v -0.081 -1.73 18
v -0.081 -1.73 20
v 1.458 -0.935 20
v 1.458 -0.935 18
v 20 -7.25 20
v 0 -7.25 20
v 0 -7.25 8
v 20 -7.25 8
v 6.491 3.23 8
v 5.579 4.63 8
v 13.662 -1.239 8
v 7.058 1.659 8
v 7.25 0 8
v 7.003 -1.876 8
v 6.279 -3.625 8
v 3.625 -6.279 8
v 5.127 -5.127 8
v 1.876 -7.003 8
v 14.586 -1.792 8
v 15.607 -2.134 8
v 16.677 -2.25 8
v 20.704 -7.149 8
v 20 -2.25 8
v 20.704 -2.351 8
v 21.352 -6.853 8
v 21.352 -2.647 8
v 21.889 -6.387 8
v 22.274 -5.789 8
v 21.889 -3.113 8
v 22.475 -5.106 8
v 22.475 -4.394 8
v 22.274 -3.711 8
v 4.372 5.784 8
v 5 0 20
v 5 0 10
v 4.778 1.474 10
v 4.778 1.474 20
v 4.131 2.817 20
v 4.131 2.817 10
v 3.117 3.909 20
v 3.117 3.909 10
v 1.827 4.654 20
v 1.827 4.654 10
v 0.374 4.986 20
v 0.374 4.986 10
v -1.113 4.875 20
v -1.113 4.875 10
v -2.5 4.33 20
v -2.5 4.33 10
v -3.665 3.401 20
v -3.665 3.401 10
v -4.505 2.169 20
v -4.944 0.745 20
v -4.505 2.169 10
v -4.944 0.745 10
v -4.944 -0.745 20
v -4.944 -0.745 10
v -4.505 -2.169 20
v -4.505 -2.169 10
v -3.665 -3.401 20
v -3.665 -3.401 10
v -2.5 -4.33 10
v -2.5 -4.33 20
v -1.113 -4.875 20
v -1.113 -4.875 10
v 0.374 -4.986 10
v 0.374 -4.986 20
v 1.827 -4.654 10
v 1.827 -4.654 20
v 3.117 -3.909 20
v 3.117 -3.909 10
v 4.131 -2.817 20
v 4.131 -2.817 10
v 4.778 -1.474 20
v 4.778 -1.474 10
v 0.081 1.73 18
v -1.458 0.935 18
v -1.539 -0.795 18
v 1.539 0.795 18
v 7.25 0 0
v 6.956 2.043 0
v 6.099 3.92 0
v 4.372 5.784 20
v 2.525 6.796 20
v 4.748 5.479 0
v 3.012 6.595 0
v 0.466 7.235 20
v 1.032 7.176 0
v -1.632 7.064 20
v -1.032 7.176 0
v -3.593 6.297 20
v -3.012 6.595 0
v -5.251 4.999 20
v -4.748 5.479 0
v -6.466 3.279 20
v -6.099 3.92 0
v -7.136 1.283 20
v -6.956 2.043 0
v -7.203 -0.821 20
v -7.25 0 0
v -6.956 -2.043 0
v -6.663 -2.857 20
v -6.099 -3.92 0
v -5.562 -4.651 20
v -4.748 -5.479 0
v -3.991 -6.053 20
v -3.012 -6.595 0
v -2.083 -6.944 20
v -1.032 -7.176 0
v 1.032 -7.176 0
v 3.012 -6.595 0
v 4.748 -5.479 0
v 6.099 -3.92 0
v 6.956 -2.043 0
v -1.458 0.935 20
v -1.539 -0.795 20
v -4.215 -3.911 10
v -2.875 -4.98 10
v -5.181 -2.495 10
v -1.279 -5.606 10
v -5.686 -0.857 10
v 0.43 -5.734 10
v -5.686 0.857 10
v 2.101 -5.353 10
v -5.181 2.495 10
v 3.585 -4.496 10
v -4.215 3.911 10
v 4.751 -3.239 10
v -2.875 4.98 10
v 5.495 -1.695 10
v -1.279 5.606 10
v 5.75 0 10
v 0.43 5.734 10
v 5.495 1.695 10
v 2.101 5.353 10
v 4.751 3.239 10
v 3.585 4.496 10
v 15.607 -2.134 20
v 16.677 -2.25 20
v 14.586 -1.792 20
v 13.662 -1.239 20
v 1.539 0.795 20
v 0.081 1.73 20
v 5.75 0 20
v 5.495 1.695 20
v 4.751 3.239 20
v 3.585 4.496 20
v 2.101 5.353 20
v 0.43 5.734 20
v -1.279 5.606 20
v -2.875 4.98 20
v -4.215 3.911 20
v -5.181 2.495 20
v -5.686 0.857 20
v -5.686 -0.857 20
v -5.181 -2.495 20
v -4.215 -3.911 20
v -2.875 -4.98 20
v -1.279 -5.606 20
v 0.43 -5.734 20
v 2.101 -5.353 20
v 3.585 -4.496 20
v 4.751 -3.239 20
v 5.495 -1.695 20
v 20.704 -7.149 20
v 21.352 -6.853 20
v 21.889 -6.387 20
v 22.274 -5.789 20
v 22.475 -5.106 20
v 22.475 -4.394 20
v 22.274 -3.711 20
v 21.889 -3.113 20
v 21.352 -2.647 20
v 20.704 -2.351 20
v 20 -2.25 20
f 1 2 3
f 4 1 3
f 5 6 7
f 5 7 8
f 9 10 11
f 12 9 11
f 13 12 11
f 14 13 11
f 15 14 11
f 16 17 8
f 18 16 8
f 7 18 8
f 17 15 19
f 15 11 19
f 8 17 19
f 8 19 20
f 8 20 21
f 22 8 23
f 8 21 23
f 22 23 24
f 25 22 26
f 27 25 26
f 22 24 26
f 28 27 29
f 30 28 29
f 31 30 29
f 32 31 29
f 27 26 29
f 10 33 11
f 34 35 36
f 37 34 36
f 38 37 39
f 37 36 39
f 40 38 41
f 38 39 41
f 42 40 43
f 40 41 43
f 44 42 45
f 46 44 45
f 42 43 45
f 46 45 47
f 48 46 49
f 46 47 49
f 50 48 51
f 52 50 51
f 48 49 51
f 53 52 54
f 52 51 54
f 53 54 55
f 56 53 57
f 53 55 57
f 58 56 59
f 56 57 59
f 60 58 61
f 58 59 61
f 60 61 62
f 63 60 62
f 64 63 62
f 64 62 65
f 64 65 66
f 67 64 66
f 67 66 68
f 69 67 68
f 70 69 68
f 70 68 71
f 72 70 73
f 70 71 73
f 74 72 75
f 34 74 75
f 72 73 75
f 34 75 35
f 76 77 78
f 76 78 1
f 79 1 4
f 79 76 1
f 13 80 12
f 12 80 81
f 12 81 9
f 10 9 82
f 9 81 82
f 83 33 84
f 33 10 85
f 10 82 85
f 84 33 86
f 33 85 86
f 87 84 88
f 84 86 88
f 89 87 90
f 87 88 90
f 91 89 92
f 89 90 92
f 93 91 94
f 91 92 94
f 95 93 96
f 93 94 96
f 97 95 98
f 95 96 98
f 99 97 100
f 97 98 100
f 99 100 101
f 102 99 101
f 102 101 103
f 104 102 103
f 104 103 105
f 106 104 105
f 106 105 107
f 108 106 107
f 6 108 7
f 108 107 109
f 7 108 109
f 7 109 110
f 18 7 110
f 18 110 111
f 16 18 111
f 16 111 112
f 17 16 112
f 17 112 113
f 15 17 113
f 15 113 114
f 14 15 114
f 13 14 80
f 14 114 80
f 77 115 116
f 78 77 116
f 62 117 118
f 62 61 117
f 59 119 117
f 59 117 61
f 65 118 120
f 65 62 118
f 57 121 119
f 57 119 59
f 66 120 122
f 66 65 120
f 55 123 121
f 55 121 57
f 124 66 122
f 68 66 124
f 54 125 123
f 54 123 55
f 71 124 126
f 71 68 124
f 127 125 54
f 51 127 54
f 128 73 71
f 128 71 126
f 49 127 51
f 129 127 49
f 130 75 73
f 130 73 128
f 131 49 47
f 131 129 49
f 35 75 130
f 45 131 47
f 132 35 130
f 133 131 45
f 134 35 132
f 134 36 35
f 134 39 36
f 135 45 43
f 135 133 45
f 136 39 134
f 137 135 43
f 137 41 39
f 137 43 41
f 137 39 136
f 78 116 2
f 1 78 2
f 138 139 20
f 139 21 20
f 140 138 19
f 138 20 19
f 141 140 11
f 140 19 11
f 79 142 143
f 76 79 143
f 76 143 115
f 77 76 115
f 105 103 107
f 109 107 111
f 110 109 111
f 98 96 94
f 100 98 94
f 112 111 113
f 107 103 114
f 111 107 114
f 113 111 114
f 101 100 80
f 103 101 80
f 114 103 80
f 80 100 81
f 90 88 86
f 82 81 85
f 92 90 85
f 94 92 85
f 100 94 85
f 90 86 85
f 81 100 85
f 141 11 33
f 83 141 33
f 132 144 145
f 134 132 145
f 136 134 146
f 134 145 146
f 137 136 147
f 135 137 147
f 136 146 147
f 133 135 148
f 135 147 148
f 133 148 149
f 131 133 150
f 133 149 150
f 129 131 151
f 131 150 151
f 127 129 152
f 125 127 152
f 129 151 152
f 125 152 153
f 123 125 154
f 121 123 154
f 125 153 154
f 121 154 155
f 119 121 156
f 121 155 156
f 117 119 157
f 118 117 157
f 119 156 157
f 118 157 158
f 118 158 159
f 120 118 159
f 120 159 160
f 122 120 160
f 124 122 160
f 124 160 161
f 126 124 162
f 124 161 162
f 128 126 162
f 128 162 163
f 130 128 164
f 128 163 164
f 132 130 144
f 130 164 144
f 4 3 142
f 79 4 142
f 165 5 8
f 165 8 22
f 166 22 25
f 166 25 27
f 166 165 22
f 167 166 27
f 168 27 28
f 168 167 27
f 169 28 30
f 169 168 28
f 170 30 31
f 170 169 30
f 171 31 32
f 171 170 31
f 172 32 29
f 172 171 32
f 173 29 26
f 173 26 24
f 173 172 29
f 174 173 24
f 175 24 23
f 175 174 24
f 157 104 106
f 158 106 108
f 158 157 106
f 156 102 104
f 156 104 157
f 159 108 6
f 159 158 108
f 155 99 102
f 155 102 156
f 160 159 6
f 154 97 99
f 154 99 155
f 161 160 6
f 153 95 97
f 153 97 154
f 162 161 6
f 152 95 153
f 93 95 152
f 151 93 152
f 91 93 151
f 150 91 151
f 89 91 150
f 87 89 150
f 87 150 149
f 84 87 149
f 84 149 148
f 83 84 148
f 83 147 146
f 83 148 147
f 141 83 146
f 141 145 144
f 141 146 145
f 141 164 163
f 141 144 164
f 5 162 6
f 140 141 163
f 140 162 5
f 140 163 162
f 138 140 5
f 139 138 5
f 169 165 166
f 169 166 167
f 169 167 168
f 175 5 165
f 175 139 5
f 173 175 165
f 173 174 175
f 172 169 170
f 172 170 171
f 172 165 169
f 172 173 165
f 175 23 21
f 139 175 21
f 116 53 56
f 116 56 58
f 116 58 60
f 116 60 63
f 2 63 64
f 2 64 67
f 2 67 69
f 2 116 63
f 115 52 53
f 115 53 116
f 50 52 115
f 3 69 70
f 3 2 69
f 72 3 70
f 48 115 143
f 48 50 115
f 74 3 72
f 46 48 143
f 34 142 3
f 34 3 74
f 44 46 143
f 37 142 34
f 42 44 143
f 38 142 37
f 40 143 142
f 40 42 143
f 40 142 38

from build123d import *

# Parameters (mm, degrees)
SKETCH_1_R          = 7.25
EXTRUDE_1_DEPTH     = 20
EXTRUDE_2_DEPTH     = 12
FILLET_1_R          = 5
SKETCH_3_R          = 5.75
CUT_EXTRUDE_1_DEPTH = 10
SKETCH_4_R          = 5
EXTRUDE_3_DEPTH     = 10
CUT_EXTRUDE_2_DEPTH = 2


with BuildPart() as part:
    # Эскиз1 → Бобышка-Вытянуть1 (new body)
    with BuildSketch(Plane.XY):
        Circle(SKETCH_1_R)
    extrude(amount=EXTRUDE_1_DEPTH)

    # Эскиз2 → Бобышка-Вытянуть2 (add)
    with BuildSketch(Plane.XY.offset(20)):
        with BuildLine():
            Line((0, -7.25), (20, -7.25))
            ThreePointArc((20, -7.25), (22.5, -4.75), (20, -2.25))
            Line((20, -2.25), (15, -2.25))
            Line((15, -2.25), (4.371714259, 5.783650615))
            ThreePointArc((4.371714259, 5.783650615), (-6.873644119, 2.305540397), (0, -7.25))
        make_face()
    extrude(amount=-EXTRUDE_2_DEPTH)

    # Скругление1
    fillet_1_edges = [part.edges().sort_by_distance(p)[0] for p in [
        (15, -2.25, 14),
    ]]
    fillet(fillet_1_edges, radius=FILLET_1_R)

    # Эскиз3 → Вырез-Вытянуть1 (cut)
    with BuildSketch(Plane.XY.offset(20)):
        Circle(SKETCH_3_R)
    extrude(amount=-CUT_EXTRUDE_1_DEPTH, mode=Mode.SUBTRACT)

    # Эскиз4 → Бобышка-Вытянуть3 (add)
    with BuildSketch(Plane.XY.offset(10)):
        Circle(SKETCH_4_R)
    extrude(amount=EXTRUDE_3_DEPTH)

    # Эскиз5 → Вырез-Вытянуть2 (cut)
    with BuildSketch(Plane.XY.offset(20)):
        Polygon((1.457985788, -0.935028044), (1.538750933, 0.795138708), (0.080765145, 1.730166752), (-1.457985788, 0.935028044), (-1.538750933, -0.795138708), (-0.080765145, -1.730166752), align=None)
    extrude(amount=-CUT_EXTRUDE_2_DEPTH, mode=Mode.SUBTRACT)


solid = part.part
